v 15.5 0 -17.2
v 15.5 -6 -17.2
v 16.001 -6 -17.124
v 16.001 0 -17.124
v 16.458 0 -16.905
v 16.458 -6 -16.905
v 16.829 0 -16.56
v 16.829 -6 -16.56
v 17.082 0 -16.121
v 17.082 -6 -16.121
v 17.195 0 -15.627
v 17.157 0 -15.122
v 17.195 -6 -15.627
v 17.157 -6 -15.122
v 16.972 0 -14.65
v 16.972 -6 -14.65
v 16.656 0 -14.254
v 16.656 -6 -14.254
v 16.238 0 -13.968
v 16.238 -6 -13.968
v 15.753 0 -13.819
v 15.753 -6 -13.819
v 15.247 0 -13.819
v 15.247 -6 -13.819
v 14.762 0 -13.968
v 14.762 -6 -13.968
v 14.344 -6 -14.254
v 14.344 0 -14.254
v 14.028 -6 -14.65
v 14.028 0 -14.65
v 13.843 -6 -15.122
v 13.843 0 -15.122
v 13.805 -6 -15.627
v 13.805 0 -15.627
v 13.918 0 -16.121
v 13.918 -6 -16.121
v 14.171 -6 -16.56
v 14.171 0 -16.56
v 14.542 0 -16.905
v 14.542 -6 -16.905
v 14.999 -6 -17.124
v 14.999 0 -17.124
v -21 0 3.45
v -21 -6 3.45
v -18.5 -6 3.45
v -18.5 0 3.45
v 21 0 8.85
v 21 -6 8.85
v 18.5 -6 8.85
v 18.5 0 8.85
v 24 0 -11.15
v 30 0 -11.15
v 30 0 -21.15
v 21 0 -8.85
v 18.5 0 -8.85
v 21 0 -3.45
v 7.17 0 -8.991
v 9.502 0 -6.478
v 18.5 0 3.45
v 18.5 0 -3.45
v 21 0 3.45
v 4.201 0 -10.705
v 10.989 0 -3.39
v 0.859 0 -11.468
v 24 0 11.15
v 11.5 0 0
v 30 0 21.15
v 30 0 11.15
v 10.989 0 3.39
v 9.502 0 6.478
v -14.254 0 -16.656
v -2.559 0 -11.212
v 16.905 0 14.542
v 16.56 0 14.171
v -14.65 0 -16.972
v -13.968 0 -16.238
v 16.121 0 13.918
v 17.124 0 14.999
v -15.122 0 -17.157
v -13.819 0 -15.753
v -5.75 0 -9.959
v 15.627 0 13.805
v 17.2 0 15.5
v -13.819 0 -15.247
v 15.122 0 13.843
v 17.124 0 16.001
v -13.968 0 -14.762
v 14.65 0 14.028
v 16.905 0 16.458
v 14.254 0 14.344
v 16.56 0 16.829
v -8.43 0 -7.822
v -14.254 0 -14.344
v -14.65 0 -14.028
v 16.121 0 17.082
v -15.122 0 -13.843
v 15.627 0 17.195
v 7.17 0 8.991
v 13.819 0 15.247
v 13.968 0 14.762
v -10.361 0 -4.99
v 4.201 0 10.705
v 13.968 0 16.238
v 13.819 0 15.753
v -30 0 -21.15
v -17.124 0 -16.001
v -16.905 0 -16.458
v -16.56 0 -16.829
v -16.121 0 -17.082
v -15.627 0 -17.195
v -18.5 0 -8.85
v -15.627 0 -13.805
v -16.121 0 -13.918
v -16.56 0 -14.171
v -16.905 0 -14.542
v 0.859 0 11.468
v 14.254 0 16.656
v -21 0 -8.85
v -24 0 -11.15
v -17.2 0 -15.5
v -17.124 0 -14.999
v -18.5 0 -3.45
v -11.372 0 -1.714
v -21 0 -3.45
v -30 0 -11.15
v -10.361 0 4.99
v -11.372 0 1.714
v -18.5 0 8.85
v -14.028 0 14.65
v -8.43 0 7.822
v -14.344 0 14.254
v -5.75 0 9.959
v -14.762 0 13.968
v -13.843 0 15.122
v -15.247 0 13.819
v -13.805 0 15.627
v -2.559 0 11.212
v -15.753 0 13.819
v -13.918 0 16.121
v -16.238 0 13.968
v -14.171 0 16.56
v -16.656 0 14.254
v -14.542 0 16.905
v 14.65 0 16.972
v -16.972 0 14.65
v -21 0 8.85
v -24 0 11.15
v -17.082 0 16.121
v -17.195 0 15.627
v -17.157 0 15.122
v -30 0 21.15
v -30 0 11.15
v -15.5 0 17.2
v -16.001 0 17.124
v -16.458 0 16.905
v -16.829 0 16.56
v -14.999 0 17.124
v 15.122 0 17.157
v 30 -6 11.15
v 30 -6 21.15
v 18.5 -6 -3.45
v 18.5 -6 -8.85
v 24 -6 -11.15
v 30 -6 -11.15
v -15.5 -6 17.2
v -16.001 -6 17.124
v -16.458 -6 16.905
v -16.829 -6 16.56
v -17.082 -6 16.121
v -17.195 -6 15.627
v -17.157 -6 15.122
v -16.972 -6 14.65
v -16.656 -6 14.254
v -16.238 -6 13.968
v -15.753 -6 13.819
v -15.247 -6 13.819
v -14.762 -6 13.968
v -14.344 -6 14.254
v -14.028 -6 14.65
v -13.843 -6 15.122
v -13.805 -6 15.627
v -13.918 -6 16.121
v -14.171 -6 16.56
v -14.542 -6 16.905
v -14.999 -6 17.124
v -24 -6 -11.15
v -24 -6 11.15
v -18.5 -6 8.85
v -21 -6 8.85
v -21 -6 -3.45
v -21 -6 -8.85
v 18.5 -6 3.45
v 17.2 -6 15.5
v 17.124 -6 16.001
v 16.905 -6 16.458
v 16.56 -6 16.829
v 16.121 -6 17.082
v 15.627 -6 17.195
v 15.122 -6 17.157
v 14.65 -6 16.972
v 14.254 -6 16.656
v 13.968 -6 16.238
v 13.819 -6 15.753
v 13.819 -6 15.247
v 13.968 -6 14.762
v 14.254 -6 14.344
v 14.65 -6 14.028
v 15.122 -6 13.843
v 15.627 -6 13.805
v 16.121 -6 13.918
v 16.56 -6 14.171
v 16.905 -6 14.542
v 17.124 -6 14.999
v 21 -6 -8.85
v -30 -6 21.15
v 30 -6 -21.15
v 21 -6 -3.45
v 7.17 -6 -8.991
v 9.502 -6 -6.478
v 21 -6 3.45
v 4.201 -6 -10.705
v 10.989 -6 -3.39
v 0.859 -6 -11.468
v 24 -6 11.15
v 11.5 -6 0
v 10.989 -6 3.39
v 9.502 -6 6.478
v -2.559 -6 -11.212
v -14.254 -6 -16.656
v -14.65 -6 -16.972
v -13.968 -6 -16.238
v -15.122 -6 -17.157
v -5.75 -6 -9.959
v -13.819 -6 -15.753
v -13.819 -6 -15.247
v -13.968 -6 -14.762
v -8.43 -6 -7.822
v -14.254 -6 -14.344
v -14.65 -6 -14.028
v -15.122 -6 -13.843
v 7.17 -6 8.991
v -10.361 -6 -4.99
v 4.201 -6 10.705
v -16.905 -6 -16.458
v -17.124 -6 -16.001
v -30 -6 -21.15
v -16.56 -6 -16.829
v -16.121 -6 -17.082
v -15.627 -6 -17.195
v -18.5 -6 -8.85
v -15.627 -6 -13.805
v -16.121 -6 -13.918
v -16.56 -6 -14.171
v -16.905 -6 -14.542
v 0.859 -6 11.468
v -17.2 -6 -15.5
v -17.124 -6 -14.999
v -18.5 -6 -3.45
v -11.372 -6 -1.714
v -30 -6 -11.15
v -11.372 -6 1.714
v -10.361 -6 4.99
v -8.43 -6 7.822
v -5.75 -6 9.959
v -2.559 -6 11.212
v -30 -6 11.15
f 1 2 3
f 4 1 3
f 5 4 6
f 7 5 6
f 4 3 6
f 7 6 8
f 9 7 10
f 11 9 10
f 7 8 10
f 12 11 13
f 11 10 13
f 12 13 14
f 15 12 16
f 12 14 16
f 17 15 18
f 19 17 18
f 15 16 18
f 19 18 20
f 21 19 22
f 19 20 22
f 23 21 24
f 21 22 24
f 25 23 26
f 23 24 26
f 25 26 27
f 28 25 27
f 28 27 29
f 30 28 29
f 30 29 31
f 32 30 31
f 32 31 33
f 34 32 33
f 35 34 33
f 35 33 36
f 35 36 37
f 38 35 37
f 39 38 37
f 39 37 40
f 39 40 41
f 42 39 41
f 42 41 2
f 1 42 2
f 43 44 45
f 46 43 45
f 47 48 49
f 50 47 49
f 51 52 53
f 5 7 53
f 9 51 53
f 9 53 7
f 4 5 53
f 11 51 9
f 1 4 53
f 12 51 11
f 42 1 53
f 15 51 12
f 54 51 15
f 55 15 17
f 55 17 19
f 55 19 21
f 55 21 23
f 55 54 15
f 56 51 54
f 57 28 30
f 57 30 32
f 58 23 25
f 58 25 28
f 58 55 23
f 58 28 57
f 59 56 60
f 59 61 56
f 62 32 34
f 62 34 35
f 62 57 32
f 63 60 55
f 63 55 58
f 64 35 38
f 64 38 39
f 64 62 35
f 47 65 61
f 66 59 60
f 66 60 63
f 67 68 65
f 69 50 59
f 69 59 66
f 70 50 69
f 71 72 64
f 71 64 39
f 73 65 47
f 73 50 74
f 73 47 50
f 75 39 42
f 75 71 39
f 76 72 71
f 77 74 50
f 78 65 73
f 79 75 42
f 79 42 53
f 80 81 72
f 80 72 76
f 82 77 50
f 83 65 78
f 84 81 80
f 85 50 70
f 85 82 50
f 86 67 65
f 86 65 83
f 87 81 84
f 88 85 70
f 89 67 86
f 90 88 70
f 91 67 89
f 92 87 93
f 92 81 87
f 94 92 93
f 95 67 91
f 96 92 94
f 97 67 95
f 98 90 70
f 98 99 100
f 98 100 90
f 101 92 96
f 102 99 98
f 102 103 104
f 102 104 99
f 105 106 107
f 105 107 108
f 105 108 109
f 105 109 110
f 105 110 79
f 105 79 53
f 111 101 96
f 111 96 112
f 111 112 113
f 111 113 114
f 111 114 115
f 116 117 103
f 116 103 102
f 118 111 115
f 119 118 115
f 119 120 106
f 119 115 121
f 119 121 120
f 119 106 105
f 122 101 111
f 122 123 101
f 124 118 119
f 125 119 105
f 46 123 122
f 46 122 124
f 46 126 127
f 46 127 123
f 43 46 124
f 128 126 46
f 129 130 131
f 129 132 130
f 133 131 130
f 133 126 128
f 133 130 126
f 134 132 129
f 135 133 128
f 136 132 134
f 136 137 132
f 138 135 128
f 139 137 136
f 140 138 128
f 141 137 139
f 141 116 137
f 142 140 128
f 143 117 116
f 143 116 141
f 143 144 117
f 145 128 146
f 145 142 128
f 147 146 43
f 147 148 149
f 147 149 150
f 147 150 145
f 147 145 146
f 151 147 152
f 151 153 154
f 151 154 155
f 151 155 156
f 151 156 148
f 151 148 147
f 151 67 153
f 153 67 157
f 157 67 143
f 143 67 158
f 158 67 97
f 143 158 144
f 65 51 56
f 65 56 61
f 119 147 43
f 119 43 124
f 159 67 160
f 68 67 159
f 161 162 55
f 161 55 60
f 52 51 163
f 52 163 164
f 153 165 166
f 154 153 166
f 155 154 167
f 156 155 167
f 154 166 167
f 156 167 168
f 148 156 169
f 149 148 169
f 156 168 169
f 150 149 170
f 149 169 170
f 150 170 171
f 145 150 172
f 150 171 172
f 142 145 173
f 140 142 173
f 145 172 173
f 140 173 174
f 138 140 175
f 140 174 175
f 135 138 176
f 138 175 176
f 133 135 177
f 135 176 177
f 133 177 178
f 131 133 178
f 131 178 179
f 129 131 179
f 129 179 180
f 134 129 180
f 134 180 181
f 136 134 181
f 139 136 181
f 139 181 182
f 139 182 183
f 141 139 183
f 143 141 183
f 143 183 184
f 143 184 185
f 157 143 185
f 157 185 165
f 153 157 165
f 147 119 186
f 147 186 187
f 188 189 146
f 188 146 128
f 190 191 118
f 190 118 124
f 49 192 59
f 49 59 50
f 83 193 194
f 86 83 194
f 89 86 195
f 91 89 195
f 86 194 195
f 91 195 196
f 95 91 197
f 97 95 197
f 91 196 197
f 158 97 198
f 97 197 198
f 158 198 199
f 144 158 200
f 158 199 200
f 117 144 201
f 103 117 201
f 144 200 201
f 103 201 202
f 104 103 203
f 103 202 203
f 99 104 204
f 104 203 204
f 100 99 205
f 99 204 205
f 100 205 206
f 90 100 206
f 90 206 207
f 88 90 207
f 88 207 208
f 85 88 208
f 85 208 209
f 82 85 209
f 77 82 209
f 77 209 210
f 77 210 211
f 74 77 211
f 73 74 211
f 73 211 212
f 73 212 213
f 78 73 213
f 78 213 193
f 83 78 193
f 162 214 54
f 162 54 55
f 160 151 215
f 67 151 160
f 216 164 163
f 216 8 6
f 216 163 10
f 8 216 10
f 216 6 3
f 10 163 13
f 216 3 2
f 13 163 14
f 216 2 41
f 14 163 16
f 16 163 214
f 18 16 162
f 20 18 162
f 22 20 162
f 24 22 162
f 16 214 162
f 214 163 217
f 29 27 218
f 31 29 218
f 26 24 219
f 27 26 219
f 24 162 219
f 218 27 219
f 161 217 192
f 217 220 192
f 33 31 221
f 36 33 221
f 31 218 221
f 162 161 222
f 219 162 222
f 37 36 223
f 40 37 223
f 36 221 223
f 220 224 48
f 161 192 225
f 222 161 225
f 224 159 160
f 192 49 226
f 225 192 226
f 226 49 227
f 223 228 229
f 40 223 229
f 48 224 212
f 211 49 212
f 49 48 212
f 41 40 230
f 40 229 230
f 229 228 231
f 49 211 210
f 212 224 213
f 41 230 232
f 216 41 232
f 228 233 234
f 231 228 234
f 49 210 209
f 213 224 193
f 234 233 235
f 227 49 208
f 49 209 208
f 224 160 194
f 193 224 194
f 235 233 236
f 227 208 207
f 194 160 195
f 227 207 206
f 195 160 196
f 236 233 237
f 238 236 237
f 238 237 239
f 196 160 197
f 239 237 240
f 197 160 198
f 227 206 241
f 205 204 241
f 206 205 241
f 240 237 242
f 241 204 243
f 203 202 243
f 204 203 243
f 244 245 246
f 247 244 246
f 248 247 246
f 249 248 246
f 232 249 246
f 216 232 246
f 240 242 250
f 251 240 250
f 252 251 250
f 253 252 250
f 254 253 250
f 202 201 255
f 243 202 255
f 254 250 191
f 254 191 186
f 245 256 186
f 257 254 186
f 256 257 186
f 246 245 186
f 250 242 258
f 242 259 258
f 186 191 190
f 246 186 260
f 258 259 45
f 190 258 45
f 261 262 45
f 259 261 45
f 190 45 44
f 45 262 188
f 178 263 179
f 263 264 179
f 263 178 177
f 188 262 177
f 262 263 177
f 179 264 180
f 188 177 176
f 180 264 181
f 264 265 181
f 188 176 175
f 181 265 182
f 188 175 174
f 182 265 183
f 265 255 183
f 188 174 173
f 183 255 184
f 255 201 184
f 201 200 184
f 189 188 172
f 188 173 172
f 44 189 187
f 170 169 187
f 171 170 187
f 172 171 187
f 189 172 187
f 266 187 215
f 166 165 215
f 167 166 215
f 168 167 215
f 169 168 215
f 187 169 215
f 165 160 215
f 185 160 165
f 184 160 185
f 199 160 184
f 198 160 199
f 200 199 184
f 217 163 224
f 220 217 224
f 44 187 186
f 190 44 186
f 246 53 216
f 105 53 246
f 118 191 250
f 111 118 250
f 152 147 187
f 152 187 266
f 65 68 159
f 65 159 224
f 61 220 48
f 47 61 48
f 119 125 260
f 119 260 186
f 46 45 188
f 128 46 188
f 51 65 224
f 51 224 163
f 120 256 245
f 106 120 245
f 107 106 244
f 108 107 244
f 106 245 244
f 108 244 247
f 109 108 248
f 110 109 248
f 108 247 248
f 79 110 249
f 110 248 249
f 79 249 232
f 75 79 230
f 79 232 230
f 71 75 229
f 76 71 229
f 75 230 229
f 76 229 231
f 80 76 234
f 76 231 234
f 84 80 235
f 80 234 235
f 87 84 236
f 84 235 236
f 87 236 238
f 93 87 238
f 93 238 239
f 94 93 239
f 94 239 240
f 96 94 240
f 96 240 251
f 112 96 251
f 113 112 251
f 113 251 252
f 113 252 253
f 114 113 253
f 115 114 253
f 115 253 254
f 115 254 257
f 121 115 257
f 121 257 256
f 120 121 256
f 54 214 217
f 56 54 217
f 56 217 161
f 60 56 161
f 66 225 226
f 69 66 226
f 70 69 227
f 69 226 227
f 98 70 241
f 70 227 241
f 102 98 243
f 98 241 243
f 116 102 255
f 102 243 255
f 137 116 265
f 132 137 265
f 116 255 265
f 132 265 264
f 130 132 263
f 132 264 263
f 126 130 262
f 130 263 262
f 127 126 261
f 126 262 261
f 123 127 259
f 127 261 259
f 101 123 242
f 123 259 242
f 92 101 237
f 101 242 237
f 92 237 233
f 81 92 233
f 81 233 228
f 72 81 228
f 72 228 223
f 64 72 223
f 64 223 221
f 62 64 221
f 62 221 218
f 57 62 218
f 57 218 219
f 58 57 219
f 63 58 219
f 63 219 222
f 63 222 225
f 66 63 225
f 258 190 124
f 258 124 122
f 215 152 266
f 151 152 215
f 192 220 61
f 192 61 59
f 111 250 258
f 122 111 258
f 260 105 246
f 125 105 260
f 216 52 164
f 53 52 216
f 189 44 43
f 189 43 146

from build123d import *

# Parameters (mm, degrees)
PAD_DEPTH          = 6
SKETCH001_R        = 11.5
POCKET_DEPTH       = 6.001
SKETCH002_W        = 2.5
SKETCH002_H        = 5.4
POCKET001_DEPTH    = 153.314136
SKETCH003_R        = 1.7
POCKET002_DEPTH    = 153.314136
POLARPATTERN_COUNT = 4


with BuildPart() as part:
    # Sketch → Pad (new body)
    with BuildSketch(Plane.XZ):
        Polygon((-30, 21.15), (30, 21.15), (30, 11.15), (24, 11.15), (24, -11.15), (30, -11.15), (30, -21.15), (-30, -21.15), (-30, -11.15), (-24, -11.15), (-24, 11.15), (-30, 11.15), align=None)
    extrude(amount=PAD_DEPTH)

    # Sketch001 (on Face14 of Pad) → Pocket (cut, through all)
    with BuildSketch(Plane.XZ.offset(6)):
        Circle(SKETCH001_R)
    extrude(amount=-POCKET_DEPTH, mode=Mode.SUBTRACT)

    # Sketch002 (on Face5 of Pocket) → Pocket001 (cut, through all)
    with BuildSketch(Plane.XZ.offset(6)):
        with Locations((-19.75, 6.15)):
            Rectangle(SKETCH002_W, SKETCH002_H)
        with Locations((-19.75, -6.15)):
            Rectangle(SKETCH002_W, SKETCH002_H)
    pocket001 = extrude(amount=-POCKET001_DEPTH, mode=Mode.SUBTRACT)

    # Mirrored: Pocket001 across Sketch002 V_Axis
    add(pocket001.mirror(Plane(origin=(0, -6, 0), x_dir=(0, -1, 0), z_dir=(1, 0, 0))), mode=Mode.SUBTRACT)

    # Sketch003 (on Face5 of Mirrored) → Pocket002 (cut, through all)
    with BuildSketch(Plane.XZ.offset(6)):
        with Locations((15.5, 15.5)):
            Circle(SKETCH003_R)
    pocket002 = extrude(amount=-POCKET002_DEPTH, mode=Mode.SUBTRACT)

    # PolarPattern: Pocket002 ×4 about axis
    polarpattern_axis = Axis((0, -6, 0), (0, -1, 0))
    for i in range(1, POLARPATTERN_COUNT):
        add(pocket002.rotate(polarpattern_axis, i * 360 / POLARPATTERN_COUNT), mode=Mode.SUBTRACT)


solid = part.part
